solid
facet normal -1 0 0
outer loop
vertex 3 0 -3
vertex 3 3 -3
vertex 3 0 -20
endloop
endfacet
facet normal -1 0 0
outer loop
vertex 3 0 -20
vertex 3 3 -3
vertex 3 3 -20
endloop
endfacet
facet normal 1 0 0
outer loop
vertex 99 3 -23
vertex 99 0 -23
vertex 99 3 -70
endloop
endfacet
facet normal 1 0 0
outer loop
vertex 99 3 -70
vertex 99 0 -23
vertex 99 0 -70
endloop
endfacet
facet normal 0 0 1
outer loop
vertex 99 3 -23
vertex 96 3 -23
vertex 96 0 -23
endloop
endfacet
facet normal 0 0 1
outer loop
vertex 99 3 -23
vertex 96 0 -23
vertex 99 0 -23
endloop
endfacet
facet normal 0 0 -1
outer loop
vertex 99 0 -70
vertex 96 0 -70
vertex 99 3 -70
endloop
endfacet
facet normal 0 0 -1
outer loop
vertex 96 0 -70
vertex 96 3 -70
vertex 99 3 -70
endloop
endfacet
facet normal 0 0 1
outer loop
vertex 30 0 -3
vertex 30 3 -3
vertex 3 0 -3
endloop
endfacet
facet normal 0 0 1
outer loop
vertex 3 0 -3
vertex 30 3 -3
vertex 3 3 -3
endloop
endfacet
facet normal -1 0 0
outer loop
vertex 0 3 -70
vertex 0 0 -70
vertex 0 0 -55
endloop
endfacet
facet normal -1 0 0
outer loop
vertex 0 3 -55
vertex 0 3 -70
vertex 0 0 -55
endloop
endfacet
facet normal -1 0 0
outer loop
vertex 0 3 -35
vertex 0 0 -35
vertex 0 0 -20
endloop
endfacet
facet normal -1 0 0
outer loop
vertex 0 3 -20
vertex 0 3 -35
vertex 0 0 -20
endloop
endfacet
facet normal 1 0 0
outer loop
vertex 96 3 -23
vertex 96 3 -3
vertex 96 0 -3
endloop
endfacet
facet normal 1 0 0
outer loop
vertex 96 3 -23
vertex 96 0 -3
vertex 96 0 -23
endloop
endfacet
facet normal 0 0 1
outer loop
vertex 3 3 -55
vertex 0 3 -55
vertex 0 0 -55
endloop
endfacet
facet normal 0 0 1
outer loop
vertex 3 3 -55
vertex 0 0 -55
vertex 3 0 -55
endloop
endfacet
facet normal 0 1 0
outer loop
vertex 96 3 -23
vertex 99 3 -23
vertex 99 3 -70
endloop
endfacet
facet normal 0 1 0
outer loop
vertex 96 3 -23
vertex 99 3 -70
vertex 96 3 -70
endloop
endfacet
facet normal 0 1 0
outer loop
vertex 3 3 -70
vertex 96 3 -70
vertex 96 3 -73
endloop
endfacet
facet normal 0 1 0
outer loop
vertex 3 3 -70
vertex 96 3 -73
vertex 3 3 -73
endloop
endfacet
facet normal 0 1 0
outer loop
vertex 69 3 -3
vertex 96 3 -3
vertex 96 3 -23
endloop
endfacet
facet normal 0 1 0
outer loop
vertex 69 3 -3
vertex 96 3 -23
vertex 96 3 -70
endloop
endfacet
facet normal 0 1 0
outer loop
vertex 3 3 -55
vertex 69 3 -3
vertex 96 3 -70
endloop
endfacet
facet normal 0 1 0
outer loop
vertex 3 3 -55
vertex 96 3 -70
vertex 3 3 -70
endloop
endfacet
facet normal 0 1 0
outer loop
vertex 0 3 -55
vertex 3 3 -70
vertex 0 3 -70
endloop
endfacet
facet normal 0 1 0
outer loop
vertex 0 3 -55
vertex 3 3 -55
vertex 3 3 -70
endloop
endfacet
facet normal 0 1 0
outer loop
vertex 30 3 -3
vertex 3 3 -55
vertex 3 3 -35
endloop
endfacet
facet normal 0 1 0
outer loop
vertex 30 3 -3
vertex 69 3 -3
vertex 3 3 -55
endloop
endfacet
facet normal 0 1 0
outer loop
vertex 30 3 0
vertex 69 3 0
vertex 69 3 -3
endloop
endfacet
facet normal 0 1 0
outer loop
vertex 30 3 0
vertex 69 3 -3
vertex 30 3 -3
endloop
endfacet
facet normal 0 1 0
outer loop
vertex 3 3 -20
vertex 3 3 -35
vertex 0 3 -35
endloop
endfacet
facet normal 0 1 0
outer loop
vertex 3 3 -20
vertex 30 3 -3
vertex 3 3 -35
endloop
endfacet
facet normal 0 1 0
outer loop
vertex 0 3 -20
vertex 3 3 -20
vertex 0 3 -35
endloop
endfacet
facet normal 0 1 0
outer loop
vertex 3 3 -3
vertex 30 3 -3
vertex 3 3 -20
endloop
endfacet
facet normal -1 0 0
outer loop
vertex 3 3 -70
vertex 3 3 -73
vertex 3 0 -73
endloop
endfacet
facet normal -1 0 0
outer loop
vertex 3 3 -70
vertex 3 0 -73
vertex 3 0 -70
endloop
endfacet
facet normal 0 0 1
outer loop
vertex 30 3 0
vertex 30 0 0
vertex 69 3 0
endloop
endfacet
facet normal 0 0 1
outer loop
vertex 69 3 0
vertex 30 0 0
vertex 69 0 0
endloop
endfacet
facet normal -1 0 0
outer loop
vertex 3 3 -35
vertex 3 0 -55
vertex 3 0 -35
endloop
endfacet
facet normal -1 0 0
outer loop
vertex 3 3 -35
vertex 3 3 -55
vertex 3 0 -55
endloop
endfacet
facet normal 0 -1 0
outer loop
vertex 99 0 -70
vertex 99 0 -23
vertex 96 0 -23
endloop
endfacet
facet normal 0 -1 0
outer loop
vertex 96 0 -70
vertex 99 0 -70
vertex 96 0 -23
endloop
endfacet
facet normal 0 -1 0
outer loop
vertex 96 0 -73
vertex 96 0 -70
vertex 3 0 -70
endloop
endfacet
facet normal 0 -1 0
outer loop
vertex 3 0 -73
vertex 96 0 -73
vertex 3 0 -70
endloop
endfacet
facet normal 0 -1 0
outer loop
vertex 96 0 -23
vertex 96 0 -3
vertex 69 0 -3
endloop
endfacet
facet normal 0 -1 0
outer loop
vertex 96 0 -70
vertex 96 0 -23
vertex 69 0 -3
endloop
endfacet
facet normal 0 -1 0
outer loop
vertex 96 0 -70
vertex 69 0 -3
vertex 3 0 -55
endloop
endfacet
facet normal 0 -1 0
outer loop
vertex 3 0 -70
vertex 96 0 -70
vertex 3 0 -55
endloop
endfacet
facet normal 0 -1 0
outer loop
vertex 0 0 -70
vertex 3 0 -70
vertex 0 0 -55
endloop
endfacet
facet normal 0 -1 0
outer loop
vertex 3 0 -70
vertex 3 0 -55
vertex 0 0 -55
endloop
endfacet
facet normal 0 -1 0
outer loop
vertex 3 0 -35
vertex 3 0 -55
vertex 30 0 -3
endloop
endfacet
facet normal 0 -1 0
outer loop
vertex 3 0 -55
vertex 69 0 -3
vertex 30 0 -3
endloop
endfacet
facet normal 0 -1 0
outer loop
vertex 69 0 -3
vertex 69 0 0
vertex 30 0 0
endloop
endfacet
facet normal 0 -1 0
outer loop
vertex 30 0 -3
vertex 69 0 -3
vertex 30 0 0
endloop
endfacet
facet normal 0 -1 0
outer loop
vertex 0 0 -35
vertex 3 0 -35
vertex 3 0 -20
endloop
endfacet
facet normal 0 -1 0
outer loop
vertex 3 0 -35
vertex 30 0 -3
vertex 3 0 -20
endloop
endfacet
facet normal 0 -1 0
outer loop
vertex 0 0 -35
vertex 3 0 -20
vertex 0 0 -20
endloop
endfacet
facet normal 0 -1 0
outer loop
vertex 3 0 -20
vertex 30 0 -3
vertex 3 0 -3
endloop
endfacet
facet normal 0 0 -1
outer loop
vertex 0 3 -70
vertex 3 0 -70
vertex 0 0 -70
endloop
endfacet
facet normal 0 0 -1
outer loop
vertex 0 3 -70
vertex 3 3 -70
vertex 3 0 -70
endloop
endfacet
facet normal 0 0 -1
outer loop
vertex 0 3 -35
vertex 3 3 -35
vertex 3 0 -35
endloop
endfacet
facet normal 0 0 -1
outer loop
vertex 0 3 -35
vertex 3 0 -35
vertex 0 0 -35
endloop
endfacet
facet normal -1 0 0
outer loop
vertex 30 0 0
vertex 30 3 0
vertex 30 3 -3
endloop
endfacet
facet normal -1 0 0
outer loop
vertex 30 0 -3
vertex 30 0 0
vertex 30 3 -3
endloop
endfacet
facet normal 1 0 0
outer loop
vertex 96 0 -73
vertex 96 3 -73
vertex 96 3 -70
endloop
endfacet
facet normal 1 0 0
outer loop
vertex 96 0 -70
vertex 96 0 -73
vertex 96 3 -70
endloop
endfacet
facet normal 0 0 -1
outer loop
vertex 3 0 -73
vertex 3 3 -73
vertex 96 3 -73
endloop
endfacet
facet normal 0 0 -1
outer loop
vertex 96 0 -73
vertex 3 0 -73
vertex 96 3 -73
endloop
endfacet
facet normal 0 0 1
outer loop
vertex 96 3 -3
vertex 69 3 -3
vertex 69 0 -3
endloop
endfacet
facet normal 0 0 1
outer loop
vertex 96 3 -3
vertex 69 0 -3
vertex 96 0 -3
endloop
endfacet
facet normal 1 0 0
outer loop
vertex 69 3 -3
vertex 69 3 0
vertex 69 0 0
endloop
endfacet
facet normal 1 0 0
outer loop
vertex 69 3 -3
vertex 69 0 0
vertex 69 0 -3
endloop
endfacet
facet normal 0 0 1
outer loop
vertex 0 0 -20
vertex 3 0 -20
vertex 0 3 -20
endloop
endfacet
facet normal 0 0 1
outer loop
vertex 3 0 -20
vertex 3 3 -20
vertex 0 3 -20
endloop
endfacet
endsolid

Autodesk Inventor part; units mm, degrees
ref_plane "YZ Plane" through (0, 0, 0) normal (1, 0, 0) x (0, 1, 0)
ref_plane "XZ Plane" through (0, 0, 0) normal (0, 1, 0) x (-1, 0, 0)
ref_plane "XY Plane" through (0, 0, 0) normal (0, 0, 1) x (1, 0, 0)
sketch "Sketch1" plane through (0, 0, 0) normal (0, 1, 0) x (-1, 0, 0)
  point P0 (0, 0)
sketch "Sketch2" plane through (0, 0, 0) normal (0, 1, 0) x (-1, 0, 0)
  line L0 (0, 0) -> (-99, 0)
  line L1 (-99, 0) -> (-99, -90)
  line L2 (-99, -90) -> (0, -90)
  line L3 (0, -90) -> (0, 0)
  dimension "d0" = 99
  dimension "d1" = 90
extrude "Extrusion1" add sketch "Sketch2" along normal blind 3
sketch "Sketch3" plane through (0, 3, 0) normal (0, 1, 0) x (1, 0, 0)
  line L0 (99, 0) -> (99, 90) projected
  line L1 (99, 0) -> (69, 0)
  line L2 (69, 0) -> (69, 3)
  line L3 (69, 3) -> (99, 3)
  line L4 (99, 3) -> (99, 0)
  line L5 (0, 0) -> (99, 0) projected
  line L6 (0, 0) -> (30, 0)
  line L7 (30, 0) -> (30, 3)
  line L8 (30, 3) -> (0, 3)
  line L9 (0, 3) -> (0, 0)
  line L10 (0, 3) -> (3, 3)
  line L11 (3, 3) -> (3, 20)
  line L12 (3, 20) -> (0, 20)
  line L13 (0, 20) -> (0, 3)
  line L14 (0, 90) -> (0, 0) projected
  line L15 (99, 3) -> (96, 3)
  line L16 (96, 3) -> (96, 23)
  line L17 (96, 23) -> (99, 23)
  line L18 (99, 23) -> (99, 3)
  line L19 (99, 90) -> (96, 90)
  line L20 (96, 90) -> (96, 70)
  line L21 (96, 70) -> (99, 70)
  line L22 (99, 70) -> (99, 90)
  line L23 (3, 35) -> (0, 35)
  line L24 (0, 35) -> (0, 55)
  line L25 (0, 55) -> (3, 55)
  line L26 (3, 55) -> (3, 35)
  line L27 (99, 90) -> (0, 90) projected
  line L28 (0, 90) -> (3, 90)
  line L29 (3, 90) -> (3, 70)
  line L30 (3, 70) -> (0, 70)
  line L31 (0, 70) -> (0, 90)
  dimension "d4" = 30
  dimension "d5" = 3
  dimension "d6" = 30
  dimension "d7" = 3
  dimension "d8" = 3
  dimension "d9" = 17
  dimension "d12" = 3
  dimension "d13" = 20
  dimension "d14" = 3
  dimension "d15" = 20
  dimension "d16" = 20
  dimension "d17" = 3
  dimension "d18" = 15
  dimension "d19" = 3
  dimension "d20" = 15
extrude "Extrusion2" cut sketch "Sketch3" against normal through all contours L1 L2 L3 L0 | L3 L16 L17 L0 | L5 L9 L8 L7 | L21 L20 L19 L0 | L13 L12 L11 L8 | L29 L30 L14 L27 | L14 L25 L26 L23
sketch "Sketch4" plane through (0, 3, 0) normal (0, 1, 0) x (1, 0, 0)
  line L0 (77.6899, 73) -> (37.1359, 73)
  line L1 (69, 3) -> (96, 3) projected
  line L2 (96, 90) -> (3, 90) projected
  line L3 (3, 90) -> (3, 70) projected
  line L4 (96, 90) -> (3, 90)
  line L5 (3, 90) -> (3, 73)
  line L6 (3, 73) -> (96, 73)
  line L7 (96, 73) -> (96, 90)
  point P0 (0, 0)
  dimension "d23" = 70
  dimension "d24" = 70
extrude "Extrusion3" cut sketch "Sketch4" against normal through all
properties part number "top_left_v2"
